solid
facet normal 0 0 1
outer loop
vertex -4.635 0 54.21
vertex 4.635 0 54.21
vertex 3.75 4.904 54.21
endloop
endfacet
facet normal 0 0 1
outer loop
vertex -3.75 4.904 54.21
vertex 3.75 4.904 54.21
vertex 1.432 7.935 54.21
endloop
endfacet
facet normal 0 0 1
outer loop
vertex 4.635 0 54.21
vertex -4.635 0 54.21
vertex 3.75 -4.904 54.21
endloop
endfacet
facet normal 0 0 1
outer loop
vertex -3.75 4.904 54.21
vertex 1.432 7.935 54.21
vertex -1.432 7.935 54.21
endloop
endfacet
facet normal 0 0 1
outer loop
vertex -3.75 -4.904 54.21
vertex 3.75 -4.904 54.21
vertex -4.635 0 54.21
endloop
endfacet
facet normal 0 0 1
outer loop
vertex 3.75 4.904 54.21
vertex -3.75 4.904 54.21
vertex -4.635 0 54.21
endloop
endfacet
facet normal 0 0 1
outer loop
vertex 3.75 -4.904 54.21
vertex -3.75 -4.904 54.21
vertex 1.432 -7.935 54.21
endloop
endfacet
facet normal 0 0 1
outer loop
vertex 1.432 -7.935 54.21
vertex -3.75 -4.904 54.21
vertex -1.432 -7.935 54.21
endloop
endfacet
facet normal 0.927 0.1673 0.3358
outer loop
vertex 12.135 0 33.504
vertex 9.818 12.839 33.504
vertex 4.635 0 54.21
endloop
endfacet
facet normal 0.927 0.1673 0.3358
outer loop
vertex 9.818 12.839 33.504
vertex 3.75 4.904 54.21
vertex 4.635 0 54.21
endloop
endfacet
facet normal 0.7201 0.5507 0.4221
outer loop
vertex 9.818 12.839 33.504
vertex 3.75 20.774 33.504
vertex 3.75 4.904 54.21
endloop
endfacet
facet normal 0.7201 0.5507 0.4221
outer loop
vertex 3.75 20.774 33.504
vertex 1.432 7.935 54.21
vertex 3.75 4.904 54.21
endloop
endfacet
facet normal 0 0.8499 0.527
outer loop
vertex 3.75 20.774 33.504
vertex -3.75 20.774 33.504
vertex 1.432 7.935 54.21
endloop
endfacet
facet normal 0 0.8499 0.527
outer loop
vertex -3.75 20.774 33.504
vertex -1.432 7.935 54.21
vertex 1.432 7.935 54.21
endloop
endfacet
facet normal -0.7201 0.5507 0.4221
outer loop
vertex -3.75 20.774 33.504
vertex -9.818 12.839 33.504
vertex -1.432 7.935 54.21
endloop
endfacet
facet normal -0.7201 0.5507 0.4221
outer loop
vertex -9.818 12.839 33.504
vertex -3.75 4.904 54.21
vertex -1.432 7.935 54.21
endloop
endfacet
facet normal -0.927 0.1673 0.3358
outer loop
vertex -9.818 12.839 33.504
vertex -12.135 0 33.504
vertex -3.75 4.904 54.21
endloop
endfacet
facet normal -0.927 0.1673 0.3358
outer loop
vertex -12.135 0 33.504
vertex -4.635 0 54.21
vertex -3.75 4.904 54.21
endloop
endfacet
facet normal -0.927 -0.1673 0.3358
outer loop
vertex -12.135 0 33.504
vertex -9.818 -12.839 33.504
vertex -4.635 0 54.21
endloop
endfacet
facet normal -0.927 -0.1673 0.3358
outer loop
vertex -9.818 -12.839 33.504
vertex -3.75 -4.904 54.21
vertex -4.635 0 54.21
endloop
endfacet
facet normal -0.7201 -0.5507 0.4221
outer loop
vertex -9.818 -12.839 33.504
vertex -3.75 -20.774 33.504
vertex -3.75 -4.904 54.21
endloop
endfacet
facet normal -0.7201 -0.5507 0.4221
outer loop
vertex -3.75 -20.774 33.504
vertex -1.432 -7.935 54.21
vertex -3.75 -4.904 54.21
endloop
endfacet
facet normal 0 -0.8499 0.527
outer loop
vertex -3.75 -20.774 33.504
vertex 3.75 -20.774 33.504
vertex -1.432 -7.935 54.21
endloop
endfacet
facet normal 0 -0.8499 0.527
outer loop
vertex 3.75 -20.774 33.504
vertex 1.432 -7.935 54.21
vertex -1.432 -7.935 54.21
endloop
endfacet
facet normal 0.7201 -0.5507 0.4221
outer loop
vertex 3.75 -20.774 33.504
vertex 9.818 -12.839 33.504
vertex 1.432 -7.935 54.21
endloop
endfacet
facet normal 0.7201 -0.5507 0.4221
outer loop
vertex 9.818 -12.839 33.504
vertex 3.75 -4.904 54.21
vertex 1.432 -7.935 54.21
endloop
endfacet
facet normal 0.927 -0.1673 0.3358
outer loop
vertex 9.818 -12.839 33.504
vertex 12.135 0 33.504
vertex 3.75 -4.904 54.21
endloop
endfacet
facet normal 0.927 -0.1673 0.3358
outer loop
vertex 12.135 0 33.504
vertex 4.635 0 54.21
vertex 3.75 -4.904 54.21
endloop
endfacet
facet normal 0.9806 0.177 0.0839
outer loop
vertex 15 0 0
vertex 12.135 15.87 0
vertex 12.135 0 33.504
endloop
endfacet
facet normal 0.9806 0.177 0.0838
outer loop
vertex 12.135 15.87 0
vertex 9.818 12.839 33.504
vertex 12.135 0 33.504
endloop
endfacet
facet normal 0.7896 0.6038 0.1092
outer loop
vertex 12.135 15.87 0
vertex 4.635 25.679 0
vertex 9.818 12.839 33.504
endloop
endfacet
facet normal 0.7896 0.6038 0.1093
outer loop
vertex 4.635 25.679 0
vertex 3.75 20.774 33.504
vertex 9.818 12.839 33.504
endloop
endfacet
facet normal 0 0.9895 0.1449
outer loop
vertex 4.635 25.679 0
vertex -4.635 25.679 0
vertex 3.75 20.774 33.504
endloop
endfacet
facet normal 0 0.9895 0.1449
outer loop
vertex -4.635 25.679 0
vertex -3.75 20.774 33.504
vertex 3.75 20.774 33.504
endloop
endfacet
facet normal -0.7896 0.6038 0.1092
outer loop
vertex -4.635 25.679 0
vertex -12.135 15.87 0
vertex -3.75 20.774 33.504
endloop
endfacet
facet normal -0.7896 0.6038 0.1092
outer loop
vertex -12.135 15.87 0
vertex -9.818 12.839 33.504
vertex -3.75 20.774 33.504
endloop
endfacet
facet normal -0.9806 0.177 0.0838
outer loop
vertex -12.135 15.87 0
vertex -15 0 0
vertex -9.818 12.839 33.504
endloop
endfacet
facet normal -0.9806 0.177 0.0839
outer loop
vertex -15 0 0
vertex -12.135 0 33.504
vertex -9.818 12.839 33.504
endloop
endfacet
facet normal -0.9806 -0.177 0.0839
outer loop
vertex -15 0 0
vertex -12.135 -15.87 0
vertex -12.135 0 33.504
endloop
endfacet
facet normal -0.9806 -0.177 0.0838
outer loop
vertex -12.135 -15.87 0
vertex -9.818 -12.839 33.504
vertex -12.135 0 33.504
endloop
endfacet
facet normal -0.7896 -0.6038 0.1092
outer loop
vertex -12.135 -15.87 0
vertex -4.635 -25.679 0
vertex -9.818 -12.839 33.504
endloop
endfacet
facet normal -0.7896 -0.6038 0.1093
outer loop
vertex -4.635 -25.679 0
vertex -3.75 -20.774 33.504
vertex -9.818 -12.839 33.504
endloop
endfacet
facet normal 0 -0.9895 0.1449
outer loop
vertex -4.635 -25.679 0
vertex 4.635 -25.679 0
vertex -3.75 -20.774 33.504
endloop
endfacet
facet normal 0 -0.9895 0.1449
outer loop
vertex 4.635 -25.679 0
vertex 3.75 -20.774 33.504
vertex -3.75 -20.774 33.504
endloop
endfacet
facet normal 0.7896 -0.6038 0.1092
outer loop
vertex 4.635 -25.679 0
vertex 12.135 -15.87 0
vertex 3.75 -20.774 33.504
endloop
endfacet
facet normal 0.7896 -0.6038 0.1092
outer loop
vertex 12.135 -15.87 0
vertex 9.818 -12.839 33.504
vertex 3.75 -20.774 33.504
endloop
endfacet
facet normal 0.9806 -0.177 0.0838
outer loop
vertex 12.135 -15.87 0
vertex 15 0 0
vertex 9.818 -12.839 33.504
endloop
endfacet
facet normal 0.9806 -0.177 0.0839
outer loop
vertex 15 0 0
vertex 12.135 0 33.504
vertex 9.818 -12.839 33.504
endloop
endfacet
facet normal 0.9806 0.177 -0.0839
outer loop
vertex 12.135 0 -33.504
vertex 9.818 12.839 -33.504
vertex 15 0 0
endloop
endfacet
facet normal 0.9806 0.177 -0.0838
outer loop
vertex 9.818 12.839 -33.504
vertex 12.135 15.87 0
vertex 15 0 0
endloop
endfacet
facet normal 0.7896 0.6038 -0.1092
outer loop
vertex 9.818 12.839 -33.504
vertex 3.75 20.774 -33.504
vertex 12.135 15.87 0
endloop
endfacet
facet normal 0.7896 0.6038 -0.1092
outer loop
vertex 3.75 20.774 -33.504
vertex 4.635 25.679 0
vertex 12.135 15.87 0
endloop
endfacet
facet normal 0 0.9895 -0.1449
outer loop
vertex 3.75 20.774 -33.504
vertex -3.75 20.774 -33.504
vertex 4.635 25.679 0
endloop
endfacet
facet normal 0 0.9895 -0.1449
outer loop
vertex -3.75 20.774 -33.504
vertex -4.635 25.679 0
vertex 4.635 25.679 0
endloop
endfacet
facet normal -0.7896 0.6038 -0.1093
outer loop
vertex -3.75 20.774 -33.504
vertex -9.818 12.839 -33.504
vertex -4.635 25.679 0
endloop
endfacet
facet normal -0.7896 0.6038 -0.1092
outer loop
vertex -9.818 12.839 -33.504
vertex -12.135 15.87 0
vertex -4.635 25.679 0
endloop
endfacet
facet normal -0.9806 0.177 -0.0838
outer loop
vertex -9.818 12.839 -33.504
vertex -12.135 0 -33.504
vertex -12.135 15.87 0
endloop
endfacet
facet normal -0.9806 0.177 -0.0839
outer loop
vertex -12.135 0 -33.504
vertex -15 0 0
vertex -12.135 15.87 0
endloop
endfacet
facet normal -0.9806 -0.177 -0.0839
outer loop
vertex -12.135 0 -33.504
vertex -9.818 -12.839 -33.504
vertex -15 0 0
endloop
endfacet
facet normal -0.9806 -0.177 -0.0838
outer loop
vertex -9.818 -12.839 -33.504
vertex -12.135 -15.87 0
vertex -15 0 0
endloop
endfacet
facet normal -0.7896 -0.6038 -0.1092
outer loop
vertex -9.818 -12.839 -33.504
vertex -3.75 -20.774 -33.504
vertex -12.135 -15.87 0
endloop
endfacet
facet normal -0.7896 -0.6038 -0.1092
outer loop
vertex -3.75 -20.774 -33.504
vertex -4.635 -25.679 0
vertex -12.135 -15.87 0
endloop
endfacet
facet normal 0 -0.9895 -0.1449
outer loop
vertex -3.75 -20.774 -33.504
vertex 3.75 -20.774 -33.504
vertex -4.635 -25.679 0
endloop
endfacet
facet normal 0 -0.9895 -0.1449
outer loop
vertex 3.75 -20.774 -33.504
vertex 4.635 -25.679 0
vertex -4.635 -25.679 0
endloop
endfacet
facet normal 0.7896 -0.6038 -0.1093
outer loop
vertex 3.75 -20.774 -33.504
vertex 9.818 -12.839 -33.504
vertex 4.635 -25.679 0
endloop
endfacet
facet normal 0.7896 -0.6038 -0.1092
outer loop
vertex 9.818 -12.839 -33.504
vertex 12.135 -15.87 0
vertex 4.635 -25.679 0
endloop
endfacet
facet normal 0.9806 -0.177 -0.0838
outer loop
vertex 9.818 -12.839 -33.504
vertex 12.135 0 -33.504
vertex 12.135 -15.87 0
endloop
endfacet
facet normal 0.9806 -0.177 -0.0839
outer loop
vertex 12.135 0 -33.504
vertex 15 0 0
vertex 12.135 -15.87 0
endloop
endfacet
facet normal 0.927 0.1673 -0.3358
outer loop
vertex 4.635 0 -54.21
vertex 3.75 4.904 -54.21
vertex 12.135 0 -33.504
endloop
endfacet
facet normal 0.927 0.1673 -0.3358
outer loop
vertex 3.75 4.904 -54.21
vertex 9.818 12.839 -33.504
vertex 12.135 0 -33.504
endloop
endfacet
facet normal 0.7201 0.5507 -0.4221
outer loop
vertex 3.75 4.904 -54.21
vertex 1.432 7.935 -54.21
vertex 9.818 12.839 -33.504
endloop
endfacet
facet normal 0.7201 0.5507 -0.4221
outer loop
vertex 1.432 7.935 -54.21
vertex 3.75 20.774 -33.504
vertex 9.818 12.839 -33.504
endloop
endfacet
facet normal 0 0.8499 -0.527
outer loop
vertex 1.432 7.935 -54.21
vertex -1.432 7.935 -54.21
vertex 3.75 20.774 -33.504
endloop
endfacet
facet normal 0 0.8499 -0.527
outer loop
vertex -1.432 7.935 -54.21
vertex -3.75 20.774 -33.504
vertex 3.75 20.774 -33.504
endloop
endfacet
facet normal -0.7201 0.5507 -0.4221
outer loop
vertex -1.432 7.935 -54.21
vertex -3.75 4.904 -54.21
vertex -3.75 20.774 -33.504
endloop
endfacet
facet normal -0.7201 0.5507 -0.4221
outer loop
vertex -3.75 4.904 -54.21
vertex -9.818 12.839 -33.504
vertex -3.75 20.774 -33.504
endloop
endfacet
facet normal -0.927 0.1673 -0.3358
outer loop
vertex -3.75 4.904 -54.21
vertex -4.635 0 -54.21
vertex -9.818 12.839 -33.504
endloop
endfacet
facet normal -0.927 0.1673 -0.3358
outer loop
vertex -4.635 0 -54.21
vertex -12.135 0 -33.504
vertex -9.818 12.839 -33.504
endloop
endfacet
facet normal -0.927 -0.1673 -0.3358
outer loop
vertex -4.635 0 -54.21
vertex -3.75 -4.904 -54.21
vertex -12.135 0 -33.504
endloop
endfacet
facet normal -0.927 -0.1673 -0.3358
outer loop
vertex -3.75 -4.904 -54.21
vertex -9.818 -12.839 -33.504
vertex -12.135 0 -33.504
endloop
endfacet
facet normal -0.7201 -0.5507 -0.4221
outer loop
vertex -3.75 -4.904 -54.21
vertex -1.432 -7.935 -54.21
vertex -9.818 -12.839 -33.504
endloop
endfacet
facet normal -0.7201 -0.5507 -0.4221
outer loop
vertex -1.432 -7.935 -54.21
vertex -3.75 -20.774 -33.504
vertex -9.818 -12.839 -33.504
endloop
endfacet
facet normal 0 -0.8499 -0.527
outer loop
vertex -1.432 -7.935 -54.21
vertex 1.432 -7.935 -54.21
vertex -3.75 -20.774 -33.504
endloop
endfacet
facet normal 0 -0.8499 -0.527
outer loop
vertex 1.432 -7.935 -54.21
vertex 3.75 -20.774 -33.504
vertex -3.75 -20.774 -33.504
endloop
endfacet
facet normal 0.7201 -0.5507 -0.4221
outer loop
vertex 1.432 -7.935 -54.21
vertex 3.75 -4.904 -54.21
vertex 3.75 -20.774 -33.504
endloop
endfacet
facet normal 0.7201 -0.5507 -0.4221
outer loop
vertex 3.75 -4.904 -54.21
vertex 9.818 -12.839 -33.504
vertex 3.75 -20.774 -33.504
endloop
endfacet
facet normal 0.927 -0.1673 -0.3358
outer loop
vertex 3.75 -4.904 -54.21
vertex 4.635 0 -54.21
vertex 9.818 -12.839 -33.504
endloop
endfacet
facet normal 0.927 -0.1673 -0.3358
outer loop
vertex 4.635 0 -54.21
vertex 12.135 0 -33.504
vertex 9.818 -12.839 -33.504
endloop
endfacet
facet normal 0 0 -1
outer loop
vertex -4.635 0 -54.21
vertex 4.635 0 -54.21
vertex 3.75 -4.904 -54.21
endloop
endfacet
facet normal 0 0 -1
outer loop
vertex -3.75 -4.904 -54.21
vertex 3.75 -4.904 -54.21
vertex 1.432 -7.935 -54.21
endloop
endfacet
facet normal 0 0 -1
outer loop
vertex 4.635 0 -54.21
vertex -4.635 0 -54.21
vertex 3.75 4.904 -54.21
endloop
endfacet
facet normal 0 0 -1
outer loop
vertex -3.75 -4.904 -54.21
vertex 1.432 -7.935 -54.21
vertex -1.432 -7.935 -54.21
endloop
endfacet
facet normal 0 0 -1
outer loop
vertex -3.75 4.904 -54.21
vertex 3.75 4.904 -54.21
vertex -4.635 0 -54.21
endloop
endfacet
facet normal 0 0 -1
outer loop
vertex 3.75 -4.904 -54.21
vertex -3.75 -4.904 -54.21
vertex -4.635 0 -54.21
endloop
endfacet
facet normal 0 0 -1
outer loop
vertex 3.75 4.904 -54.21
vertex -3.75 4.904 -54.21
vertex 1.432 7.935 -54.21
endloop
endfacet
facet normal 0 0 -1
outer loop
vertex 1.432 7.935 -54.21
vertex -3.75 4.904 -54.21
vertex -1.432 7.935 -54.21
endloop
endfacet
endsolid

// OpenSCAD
// Generated by SolidPython 1.0.1 on 2020-07-29 00:46:46


scale(v = [5, 9, 19]) {
	sphere(r = 3);
}
/***********************************************
*********      SolidPython code:      **********
************************************************
 
# import packages: SolidPython
from solid import *
from solid.utils import *
from itertools import chain, combinations, permutations


class Resize:

    def __init__(self, scad_file):
        self.scad_file = scad_file
        #self.scad_file = import_scad(scad_file)
        # cone/cylinder param:
        self.r1 = 0
        self.r2 = 0
        self.h = 0
        # rectangular prism param:
        self.w = 0
        self.l = 0
        # ellipse param:
        self.r = 0

    # import OpenScad code (file name corresponds to shape)


    # classify shape + parameters
    def assign(self, param1, param2, param3):
        if self.scad_file == 'cone.scad':
            self.r1 = param1
            self.r2 = param2
            self.h = param3
        elif self.scad_file == 'cylinder.scad':
            self.r1 = param1
            self.r2 = param2
            self.h = param3
        elif self.scad_file == 'rectangularPrism.scad':
            self.h = param1
            self.l = param2
            self.w = param3
        else:
            self.r = param1
            self.h = param2

    # resize parameters
    def iterate(self):
        x = range(3, 20, 2)
        i = 1
        if self.scad_file == 'cone.scad':
            tempList = list(permutations(x, 2))
            for temp in tempList:
                param1 = temp[0]
                param2 = temp[1]
                filepath = 'produced_scad_files/' + 'cone' + str(param1) + '_' + str(param2) + '_' + '.scad'
                scad_render_to_file(cylinder(h=param1, r1=param2, r2=0), filepath)

        elif self.scad_file == 'cylinder.scad':
            tempList = list(permutations(x, 3))
            for temp in tempList:
                param1 = temp[0]
                param2 = temp[1]
                filepath = 'produced_scad_files/' + 'cylinder' + str(param1) + '_' + str(param2) + '_' + '.scad'
                scad_render_to_file(cylinder(h=param1, r1=param2, r2=param2), filepath)

        elif self.scad_file == 'rectangularPrism.scad':
            tempList = list(permutations(x, 3))
            for temp in tempList:
                param1 = temp[0]
                param2 = temp[1]
                param3 = temp[2]
                filepath = 'produced_scad_files/' + 'rectangularPrism' + str(param1) + '_' + str(param2) + '_' + str(
                    param3) + '.scad'
                scad_render_to_file(cube(size=(param1, param2, param3)), filepath)

        elif self.scad_file == 'ellipse.scad':
            tempList = list(permutations(x, 4))
            for temp in tempList:
                param1 = temp[0]
                param2 = temp[1]
                param3 = temp[2]
                param4 = temp[3]
                filepath = 'produced_scad_files/' + 'ellipse' + str(param1) + '_' + str(param2) + '_' + str(param3) + '_' + str(param4) + '.scad'
                scad_render_to_file(scale([param1, param2, param3])(sphere(r=param4)), filepath)

    def render_to_scadfile(self):
        scad_render_to_file(scad, 'example.scad') 
 
************************************************/
